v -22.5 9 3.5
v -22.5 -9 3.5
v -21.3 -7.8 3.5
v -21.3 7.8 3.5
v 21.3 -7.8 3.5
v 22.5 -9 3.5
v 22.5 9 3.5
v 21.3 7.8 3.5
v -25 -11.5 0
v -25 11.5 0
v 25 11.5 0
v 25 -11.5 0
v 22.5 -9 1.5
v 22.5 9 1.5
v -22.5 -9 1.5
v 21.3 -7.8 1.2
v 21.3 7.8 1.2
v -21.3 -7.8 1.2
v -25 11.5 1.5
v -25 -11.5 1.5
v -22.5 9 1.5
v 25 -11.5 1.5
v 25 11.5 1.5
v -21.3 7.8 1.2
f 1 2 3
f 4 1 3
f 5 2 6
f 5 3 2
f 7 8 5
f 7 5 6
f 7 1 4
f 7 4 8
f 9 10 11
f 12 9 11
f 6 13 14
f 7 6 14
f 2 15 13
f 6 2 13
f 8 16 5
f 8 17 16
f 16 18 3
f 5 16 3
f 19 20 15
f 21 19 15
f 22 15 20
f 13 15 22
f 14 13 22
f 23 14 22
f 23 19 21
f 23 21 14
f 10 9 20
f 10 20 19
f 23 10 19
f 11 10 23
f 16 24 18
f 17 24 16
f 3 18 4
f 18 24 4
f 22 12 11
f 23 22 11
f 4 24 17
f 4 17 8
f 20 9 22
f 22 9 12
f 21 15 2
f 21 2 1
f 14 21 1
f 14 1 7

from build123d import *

# Parameters (mm, degrees)
F0_W        = 50
F0_H        = 23
F1_DEPTH    = 1.5
F2_W        = 45
F2_H        = 18
F3_DEPTH    = 2
F4_T        = 1.2
F4_T3_DEPTH = 47.4
F4_T5_DEPTH = 20.4


# Not quite as in the source:
# - a shell that OpenCascade refuses in one call is made with other operations: the cavity is built on its own and cut out


with BuildPart() as f1:
    # F0 (on Top) → F1 (new body)
    with BuildSketch(Plane.XY):
        Rectangle(F0_W, F0_H)
    extrude(amount=F1_DEPTH)

    # F2 (on face) → F3 (join)
    with BuildSketch(Plane.XY.offset(1.5)):
        Rectangle(F2_W, F2_H)
    extrude(amount=F3_DEPTH)

    # F4: shell of thickness 1.2, made by hand


with BuildPart() as f4_core1:
    # F4_t2: copy of F1
    add(f1.part)

    # the walls: a layer under each face that stays
    f4_faces = [f4_core1.faces().sort_by_distance(p)[0] for p in [
        (0, 11.5, 0.75),
        (25, 0, 0.75),
        (-25, 0, 0.75),
        (0, 0, 0),
        (-21.4285714286, -9.8571428571, 1.5),
        (0, -11.5, 0.75),
        (0, 9, 2.5),
        (-22.5, 0, 2.5),
        (0, -9, 2.5),
        (22.5, 0, 2.5),
    ]]
    thicken(f4_faces, amount=-F4_T, mode=Mode.SUBTRACT)

    # F4_s4 → F4_t3 (cut)
    with BuildSketch(Plane.YZ.offset(-23.7)):
        Polygon((9.012, 1.512), (9, 0.3), (7.8, 0.3), (7.8, 1.5), align=None)
        Polygon((-9.012, 1.512), (-9, 0.3), (-7.8, 0.3), (-7.8, 1.5), align=None)
    extrude(amount=F4_T3_DEPTH, mode=Mode.SUBTRACT)

    # F4_s6 → F4_t5 (cut)
    with BuildSketch(Plane.XZ.offset(-10.2)):
        Polygon((-22.512, 1.512), (-22.5, 0.3), (-21.3, 0.3), (-21.3, 1.5), align=None)
        Polygon((22.512, 1.512), (22.5, 0.3), (21.3, 0.3), (21.3, 1.5), align=None)
    extrude(amount=F4_T5_DEPTH, mode=Mode.SUBTRACT)


with BuildPart() as f1_1:
    add(f1.part)

    # what is left inside the walls is the cavity
    f4_cavity = [f4_core1.part.solids().sort_by_distance(p)[0] for p in [
        (0, -2.6, 3.488),
    ]]
    add(f4_cavity, mode=Mode.SUBTRACT)


solid = f1_1.part
